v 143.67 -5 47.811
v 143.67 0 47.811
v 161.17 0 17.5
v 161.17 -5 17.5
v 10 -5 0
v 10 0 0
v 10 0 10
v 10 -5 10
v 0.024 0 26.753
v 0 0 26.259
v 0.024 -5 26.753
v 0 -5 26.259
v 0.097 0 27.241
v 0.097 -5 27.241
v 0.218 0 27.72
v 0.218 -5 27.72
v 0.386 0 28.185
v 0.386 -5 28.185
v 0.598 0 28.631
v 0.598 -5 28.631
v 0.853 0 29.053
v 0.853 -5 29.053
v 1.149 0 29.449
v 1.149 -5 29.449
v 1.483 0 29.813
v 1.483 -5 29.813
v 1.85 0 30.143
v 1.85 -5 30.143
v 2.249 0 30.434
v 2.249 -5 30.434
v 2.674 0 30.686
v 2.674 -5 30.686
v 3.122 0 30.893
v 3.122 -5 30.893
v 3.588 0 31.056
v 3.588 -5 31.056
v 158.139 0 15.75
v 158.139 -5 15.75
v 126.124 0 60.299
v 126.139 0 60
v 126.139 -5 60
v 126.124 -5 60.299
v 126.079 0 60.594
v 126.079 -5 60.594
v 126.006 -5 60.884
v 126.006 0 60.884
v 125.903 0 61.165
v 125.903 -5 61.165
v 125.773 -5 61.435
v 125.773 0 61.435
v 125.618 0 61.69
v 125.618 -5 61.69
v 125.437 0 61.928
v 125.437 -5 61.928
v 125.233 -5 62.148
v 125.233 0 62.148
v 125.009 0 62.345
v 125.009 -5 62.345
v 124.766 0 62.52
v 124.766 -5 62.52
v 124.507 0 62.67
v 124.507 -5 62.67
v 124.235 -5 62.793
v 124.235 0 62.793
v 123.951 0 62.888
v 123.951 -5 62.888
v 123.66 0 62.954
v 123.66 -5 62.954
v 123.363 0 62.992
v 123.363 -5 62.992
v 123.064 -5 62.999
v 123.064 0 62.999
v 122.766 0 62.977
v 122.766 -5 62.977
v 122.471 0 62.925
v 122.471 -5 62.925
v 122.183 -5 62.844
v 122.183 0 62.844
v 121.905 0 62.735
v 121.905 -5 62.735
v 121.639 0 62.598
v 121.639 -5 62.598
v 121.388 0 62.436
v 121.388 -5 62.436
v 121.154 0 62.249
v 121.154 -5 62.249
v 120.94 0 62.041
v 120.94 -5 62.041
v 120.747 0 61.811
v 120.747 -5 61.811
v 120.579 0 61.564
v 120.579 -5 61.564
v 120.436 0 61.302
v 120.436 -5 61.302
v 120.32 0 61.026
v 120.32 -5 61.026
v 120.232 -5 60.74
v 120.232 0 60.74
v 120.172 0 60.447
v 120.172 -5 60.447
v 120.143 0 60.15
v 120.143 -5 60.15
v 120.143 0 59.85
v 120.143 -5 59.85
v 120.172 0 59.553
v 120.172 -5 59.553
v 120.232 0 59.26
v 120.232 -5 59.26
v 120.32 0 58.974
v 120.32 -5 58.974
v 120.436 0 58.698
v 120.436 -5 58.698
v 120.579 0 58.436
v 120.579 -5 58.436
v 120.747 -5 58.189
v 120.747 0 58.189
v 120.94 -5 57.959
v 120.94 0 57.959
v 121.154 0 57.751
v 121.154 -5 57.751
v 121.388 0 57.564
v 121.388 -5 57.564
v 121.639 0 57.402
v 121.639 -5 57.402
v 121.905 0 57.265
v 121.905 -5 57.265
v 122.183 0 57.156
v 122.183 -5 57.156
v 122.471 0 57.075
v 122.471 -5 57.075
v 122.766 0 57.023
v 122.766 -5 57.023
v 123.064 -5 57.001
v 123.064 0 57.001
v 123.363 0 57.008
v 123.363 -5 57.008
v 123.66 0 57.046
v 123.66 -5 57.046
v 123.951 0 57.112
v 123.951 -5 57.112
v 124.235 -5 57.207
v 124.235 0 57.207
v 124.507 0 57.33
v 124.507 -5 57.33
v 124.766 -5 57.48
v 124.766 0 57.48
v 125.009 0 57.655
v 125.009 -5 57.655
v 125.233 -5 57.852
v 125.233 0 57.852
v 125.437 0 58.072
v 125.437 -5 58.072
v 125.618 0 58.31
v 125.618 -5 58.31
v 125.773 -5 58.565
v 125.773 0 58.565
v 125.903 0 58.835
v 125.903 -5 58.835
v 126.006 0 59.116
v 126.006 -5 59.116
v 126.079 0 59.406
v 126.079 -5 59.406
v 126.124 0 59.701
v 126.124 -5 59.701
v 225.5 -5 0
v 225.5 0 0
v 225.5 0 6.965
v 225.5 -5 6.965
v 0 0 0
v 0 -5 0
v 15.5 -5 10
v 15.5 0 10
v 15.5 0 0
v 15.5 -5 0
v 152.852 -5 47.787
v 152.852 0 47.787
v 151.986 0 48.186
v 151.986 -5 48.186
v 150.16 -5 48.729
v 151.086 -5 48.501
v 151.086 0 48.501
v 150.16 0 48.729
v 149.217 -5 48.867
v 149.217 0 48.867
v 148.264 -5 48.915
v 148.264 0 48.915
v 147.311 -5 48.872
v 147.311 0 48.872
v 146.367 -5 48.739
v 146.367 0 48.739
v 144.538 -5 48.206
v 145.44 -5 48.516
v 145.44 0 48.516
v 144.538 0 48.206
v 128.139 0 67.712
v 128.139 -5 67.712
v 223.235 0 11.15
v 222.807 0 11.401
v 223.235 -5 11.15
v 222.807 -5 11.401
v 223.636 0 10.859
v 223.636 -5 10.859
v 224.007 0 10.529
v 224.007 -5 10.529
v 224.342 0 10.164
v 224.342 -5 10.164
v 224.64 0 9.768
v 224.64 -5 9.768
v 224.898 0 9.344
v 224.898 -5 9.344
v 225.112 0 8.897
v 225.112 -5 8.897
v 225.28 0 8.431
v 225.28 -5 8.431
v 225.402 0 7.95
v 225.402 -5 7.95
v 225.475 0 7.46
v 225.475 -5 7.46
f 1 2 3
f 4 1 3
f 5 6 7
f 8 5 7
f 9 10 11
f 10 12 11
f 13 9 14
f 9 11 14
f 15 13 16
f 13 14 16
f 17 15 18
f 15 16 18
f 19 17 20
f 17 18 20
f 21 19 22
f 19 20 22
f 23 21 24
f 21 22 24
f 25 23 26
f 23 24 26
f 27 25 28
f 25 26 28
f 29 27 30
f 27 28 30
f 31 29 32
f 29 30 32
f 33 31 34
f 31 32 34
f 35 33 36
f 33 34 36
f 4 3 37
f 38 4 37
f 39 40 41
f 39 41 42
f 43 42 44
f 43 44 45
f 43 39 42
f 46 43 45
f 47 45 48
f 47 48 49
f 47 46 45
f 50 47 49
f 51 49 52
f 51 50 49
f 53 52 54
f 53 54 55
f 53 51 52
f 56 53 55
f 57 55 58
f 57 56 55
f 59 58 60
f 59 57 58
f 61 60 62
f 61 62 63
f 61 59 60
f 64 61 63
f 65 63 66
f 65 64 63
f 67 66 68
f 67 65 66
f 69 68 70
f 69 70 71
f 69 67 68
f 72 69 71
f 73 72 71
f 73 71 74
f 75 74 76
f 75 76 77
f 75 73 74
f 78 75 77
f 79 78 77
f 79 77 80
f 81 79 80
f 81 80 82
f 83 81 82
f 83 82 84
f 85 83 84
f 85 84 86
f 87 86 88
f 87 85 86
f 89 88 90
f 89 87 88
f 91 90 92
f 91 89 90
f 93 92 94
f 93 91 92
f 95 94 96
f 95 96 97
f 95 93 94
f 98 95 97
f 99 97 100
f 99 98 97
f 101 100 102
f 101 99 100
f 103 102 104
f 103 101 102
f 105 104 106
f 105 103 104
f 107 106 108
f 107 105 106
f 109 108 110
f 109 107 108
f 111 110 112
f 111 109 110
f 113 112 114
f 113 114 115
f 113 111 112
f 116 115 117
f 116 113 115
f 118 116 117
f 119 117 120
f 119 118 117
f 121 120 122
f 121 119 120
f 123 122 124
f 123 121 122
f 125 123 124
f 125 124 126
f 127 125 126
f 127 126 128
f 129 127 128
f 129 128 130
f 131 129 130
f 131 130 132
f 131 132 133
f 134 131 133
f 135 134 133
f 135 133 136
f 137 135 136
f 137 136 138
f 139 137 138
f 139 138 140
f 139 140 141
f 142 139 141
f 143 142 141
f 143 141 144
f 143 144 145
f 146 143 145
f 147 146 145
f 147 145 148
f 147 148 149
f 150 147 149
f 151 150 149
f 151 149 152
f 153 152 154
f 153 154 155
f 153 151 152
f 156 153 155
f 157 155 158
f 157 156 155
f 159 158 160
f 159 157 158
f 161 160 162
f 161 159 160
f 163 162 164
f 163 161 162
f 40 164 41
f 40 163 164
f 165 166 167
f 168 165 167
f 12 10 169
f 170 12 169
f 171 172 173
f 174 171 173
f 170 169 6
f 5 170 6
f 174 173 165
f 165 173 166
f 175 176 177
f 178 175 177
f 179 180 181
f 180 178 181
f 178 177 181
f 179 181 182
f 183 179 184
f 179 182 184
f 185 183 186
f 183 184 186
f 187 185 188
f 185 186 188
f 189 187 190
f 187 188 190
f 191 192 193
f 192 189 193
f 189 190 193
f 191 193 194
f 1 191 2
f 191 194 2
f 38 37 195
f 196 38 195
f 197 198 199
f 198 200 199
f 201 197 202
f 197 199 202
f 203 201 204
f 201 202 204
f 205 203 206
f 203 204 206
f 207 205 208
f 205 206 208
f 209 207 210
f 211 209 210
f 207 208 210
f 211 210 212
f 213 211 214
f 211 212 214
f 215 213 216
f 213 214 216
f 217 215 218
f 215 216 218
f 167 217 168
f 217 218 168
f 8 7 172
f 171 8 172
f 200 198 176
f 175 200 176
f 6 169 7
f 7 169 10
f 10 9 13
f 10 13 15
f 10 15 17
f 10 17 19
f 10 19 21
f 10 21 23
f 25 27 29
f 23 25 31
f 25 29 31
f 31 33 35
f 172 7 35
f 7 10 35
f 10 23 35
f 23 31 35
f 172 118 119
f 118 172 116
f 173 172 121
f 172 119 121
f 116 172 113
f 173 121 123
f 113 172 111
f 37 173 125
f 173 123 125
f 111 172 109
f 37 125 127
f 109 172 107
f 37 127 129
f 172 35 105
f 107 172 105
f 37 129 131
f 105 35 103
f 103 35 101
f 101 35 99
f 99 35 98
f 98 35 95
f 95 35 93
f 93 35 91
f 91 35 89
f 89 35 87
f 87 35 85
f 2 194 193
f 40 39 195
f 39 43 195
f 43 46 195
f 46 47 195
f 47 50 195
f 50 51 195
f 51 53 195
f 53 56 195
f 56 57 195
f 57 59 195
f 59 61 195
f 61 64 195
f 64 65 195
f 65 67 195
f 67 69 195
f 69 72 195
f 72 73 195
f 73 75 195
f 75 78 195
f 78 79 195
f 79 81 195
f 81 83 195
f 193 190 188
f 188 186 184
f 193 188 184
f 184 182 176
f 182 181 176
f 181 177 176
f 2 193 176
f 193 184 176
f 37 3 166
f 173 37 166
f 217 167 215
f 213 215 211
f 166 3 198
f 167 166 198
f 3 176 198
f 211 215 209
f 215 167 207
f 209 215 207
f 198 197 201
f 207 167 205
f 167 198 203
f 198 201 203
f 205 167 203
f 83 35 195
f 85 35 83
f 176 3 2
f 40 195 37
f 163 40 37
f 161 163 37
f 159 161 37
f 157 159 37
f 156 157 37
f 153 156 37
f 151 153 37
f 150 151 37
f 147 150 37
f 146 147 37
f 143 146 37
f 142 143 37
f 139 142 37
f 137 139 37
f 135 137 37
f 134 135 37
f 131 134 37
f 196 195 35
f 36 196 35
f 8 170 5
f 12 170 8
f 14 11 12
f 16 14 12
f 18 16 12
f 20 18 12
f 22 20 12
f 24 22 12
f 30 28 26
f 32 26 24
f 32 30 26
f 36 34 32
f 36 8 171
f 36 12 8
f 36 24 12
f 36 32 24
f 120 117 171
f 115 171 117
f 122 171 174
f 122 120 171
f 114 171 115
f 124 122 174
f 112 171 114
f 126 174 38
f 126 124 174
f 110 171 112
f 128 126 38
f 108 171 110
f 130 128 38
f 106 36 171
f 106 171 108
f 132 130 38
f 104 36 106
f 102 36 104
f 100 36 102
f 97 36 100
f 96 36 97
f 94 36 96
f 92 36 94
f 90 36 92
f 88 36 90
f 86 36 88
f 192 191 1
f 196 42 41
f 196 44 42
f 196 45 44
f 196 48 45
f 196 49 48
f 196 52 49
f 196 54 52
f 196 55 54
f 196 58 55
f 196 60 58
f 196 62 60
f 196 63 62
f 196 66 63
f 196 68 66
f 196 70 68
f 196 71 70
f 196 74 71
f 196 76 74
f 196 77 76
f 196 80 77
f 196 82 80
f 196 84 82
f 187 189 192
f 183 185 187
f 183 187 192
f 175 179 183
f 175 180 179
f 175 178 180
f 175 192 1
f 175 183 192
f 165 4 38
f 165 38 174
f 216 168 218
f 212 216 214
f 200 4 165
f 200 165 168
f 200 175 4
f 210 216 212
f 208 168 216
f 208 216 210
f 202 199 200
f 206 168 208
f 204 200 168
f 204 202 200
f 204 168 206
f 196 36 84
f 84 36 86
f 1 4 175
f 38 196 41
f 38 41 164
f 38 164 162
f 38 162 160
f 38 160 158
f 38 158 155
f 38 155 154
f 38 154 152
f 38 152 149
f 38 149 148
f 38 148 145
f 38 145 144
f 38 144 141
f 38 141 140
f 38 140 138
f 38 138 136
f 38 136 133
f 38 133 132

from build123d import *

# Parameters (mm, degrees)
F0_R        = 3
F1_DEPTH    = 5
F2_T1_DEPTH = 32.3482938807
F3_R        = 5


# Not quite as in the source:
# - a fillet or chamfer that OpenCascade refuses, or shapes differently, is made with other operations: its cross-section is extruded or revolved along the edge and cut away or added


with BuildPart() as f1:
    # F0 (on Front) → F1 (new body)
    with BuildSketch(Plane.XZ):
        Polygon((0, 30), (0, 0), (10, 0), (10, 10), (15.5, 10), (15.5, 0), (165.5, 0), (165.5, 20), (148, 50.3108891325), (143.6698729811, 47.8108891325), (161.1698729811, 17.5), (158.1387840678, 15.75), (128.1387840678, 67.7115242271), align=None)
        with Locations((123.1387840678, 60)):
            Circle(F0_R, mode=Mode.SUBTRACT)
        Polygon((165.5, 20), (165.5, 0), (225.5, 0), (225.5, 10), (148, 50.3108891325), align=None)
    extrude(amount=F1_DEPTH)

    # F2: fillet of radius 10 on 1 edges, made by hand

    # F2_s2 → F2_t1 (cut)
    with BuildSketch(Plane.XZ.offset(-13.6741469404)):
        with BuildLine():
            ThreePointArc((152.8524940595, 47.7869104222), (148.2640985796, 48.9152185915), (143.6698729811, 47.8108891325))
            Line((143.6698729811, 47.8108891325), (148, 50.3108891325))
            Line((148, 50.3108891325), (152.8524940595, 47.7869104222))
        make_face()
    extrude(amount=F2_T1_DEPTH, mode=Mode.SUBTRACT)

    # F3
    f3_edges = [f1.edges().sort_by_distance(p)[0] for p in [
        (225.5, -2.5, 10),
        (0, -2.5, 30),
    ]]
    fillet(f3_edges, radius=F3_R)


solid = f1.part
